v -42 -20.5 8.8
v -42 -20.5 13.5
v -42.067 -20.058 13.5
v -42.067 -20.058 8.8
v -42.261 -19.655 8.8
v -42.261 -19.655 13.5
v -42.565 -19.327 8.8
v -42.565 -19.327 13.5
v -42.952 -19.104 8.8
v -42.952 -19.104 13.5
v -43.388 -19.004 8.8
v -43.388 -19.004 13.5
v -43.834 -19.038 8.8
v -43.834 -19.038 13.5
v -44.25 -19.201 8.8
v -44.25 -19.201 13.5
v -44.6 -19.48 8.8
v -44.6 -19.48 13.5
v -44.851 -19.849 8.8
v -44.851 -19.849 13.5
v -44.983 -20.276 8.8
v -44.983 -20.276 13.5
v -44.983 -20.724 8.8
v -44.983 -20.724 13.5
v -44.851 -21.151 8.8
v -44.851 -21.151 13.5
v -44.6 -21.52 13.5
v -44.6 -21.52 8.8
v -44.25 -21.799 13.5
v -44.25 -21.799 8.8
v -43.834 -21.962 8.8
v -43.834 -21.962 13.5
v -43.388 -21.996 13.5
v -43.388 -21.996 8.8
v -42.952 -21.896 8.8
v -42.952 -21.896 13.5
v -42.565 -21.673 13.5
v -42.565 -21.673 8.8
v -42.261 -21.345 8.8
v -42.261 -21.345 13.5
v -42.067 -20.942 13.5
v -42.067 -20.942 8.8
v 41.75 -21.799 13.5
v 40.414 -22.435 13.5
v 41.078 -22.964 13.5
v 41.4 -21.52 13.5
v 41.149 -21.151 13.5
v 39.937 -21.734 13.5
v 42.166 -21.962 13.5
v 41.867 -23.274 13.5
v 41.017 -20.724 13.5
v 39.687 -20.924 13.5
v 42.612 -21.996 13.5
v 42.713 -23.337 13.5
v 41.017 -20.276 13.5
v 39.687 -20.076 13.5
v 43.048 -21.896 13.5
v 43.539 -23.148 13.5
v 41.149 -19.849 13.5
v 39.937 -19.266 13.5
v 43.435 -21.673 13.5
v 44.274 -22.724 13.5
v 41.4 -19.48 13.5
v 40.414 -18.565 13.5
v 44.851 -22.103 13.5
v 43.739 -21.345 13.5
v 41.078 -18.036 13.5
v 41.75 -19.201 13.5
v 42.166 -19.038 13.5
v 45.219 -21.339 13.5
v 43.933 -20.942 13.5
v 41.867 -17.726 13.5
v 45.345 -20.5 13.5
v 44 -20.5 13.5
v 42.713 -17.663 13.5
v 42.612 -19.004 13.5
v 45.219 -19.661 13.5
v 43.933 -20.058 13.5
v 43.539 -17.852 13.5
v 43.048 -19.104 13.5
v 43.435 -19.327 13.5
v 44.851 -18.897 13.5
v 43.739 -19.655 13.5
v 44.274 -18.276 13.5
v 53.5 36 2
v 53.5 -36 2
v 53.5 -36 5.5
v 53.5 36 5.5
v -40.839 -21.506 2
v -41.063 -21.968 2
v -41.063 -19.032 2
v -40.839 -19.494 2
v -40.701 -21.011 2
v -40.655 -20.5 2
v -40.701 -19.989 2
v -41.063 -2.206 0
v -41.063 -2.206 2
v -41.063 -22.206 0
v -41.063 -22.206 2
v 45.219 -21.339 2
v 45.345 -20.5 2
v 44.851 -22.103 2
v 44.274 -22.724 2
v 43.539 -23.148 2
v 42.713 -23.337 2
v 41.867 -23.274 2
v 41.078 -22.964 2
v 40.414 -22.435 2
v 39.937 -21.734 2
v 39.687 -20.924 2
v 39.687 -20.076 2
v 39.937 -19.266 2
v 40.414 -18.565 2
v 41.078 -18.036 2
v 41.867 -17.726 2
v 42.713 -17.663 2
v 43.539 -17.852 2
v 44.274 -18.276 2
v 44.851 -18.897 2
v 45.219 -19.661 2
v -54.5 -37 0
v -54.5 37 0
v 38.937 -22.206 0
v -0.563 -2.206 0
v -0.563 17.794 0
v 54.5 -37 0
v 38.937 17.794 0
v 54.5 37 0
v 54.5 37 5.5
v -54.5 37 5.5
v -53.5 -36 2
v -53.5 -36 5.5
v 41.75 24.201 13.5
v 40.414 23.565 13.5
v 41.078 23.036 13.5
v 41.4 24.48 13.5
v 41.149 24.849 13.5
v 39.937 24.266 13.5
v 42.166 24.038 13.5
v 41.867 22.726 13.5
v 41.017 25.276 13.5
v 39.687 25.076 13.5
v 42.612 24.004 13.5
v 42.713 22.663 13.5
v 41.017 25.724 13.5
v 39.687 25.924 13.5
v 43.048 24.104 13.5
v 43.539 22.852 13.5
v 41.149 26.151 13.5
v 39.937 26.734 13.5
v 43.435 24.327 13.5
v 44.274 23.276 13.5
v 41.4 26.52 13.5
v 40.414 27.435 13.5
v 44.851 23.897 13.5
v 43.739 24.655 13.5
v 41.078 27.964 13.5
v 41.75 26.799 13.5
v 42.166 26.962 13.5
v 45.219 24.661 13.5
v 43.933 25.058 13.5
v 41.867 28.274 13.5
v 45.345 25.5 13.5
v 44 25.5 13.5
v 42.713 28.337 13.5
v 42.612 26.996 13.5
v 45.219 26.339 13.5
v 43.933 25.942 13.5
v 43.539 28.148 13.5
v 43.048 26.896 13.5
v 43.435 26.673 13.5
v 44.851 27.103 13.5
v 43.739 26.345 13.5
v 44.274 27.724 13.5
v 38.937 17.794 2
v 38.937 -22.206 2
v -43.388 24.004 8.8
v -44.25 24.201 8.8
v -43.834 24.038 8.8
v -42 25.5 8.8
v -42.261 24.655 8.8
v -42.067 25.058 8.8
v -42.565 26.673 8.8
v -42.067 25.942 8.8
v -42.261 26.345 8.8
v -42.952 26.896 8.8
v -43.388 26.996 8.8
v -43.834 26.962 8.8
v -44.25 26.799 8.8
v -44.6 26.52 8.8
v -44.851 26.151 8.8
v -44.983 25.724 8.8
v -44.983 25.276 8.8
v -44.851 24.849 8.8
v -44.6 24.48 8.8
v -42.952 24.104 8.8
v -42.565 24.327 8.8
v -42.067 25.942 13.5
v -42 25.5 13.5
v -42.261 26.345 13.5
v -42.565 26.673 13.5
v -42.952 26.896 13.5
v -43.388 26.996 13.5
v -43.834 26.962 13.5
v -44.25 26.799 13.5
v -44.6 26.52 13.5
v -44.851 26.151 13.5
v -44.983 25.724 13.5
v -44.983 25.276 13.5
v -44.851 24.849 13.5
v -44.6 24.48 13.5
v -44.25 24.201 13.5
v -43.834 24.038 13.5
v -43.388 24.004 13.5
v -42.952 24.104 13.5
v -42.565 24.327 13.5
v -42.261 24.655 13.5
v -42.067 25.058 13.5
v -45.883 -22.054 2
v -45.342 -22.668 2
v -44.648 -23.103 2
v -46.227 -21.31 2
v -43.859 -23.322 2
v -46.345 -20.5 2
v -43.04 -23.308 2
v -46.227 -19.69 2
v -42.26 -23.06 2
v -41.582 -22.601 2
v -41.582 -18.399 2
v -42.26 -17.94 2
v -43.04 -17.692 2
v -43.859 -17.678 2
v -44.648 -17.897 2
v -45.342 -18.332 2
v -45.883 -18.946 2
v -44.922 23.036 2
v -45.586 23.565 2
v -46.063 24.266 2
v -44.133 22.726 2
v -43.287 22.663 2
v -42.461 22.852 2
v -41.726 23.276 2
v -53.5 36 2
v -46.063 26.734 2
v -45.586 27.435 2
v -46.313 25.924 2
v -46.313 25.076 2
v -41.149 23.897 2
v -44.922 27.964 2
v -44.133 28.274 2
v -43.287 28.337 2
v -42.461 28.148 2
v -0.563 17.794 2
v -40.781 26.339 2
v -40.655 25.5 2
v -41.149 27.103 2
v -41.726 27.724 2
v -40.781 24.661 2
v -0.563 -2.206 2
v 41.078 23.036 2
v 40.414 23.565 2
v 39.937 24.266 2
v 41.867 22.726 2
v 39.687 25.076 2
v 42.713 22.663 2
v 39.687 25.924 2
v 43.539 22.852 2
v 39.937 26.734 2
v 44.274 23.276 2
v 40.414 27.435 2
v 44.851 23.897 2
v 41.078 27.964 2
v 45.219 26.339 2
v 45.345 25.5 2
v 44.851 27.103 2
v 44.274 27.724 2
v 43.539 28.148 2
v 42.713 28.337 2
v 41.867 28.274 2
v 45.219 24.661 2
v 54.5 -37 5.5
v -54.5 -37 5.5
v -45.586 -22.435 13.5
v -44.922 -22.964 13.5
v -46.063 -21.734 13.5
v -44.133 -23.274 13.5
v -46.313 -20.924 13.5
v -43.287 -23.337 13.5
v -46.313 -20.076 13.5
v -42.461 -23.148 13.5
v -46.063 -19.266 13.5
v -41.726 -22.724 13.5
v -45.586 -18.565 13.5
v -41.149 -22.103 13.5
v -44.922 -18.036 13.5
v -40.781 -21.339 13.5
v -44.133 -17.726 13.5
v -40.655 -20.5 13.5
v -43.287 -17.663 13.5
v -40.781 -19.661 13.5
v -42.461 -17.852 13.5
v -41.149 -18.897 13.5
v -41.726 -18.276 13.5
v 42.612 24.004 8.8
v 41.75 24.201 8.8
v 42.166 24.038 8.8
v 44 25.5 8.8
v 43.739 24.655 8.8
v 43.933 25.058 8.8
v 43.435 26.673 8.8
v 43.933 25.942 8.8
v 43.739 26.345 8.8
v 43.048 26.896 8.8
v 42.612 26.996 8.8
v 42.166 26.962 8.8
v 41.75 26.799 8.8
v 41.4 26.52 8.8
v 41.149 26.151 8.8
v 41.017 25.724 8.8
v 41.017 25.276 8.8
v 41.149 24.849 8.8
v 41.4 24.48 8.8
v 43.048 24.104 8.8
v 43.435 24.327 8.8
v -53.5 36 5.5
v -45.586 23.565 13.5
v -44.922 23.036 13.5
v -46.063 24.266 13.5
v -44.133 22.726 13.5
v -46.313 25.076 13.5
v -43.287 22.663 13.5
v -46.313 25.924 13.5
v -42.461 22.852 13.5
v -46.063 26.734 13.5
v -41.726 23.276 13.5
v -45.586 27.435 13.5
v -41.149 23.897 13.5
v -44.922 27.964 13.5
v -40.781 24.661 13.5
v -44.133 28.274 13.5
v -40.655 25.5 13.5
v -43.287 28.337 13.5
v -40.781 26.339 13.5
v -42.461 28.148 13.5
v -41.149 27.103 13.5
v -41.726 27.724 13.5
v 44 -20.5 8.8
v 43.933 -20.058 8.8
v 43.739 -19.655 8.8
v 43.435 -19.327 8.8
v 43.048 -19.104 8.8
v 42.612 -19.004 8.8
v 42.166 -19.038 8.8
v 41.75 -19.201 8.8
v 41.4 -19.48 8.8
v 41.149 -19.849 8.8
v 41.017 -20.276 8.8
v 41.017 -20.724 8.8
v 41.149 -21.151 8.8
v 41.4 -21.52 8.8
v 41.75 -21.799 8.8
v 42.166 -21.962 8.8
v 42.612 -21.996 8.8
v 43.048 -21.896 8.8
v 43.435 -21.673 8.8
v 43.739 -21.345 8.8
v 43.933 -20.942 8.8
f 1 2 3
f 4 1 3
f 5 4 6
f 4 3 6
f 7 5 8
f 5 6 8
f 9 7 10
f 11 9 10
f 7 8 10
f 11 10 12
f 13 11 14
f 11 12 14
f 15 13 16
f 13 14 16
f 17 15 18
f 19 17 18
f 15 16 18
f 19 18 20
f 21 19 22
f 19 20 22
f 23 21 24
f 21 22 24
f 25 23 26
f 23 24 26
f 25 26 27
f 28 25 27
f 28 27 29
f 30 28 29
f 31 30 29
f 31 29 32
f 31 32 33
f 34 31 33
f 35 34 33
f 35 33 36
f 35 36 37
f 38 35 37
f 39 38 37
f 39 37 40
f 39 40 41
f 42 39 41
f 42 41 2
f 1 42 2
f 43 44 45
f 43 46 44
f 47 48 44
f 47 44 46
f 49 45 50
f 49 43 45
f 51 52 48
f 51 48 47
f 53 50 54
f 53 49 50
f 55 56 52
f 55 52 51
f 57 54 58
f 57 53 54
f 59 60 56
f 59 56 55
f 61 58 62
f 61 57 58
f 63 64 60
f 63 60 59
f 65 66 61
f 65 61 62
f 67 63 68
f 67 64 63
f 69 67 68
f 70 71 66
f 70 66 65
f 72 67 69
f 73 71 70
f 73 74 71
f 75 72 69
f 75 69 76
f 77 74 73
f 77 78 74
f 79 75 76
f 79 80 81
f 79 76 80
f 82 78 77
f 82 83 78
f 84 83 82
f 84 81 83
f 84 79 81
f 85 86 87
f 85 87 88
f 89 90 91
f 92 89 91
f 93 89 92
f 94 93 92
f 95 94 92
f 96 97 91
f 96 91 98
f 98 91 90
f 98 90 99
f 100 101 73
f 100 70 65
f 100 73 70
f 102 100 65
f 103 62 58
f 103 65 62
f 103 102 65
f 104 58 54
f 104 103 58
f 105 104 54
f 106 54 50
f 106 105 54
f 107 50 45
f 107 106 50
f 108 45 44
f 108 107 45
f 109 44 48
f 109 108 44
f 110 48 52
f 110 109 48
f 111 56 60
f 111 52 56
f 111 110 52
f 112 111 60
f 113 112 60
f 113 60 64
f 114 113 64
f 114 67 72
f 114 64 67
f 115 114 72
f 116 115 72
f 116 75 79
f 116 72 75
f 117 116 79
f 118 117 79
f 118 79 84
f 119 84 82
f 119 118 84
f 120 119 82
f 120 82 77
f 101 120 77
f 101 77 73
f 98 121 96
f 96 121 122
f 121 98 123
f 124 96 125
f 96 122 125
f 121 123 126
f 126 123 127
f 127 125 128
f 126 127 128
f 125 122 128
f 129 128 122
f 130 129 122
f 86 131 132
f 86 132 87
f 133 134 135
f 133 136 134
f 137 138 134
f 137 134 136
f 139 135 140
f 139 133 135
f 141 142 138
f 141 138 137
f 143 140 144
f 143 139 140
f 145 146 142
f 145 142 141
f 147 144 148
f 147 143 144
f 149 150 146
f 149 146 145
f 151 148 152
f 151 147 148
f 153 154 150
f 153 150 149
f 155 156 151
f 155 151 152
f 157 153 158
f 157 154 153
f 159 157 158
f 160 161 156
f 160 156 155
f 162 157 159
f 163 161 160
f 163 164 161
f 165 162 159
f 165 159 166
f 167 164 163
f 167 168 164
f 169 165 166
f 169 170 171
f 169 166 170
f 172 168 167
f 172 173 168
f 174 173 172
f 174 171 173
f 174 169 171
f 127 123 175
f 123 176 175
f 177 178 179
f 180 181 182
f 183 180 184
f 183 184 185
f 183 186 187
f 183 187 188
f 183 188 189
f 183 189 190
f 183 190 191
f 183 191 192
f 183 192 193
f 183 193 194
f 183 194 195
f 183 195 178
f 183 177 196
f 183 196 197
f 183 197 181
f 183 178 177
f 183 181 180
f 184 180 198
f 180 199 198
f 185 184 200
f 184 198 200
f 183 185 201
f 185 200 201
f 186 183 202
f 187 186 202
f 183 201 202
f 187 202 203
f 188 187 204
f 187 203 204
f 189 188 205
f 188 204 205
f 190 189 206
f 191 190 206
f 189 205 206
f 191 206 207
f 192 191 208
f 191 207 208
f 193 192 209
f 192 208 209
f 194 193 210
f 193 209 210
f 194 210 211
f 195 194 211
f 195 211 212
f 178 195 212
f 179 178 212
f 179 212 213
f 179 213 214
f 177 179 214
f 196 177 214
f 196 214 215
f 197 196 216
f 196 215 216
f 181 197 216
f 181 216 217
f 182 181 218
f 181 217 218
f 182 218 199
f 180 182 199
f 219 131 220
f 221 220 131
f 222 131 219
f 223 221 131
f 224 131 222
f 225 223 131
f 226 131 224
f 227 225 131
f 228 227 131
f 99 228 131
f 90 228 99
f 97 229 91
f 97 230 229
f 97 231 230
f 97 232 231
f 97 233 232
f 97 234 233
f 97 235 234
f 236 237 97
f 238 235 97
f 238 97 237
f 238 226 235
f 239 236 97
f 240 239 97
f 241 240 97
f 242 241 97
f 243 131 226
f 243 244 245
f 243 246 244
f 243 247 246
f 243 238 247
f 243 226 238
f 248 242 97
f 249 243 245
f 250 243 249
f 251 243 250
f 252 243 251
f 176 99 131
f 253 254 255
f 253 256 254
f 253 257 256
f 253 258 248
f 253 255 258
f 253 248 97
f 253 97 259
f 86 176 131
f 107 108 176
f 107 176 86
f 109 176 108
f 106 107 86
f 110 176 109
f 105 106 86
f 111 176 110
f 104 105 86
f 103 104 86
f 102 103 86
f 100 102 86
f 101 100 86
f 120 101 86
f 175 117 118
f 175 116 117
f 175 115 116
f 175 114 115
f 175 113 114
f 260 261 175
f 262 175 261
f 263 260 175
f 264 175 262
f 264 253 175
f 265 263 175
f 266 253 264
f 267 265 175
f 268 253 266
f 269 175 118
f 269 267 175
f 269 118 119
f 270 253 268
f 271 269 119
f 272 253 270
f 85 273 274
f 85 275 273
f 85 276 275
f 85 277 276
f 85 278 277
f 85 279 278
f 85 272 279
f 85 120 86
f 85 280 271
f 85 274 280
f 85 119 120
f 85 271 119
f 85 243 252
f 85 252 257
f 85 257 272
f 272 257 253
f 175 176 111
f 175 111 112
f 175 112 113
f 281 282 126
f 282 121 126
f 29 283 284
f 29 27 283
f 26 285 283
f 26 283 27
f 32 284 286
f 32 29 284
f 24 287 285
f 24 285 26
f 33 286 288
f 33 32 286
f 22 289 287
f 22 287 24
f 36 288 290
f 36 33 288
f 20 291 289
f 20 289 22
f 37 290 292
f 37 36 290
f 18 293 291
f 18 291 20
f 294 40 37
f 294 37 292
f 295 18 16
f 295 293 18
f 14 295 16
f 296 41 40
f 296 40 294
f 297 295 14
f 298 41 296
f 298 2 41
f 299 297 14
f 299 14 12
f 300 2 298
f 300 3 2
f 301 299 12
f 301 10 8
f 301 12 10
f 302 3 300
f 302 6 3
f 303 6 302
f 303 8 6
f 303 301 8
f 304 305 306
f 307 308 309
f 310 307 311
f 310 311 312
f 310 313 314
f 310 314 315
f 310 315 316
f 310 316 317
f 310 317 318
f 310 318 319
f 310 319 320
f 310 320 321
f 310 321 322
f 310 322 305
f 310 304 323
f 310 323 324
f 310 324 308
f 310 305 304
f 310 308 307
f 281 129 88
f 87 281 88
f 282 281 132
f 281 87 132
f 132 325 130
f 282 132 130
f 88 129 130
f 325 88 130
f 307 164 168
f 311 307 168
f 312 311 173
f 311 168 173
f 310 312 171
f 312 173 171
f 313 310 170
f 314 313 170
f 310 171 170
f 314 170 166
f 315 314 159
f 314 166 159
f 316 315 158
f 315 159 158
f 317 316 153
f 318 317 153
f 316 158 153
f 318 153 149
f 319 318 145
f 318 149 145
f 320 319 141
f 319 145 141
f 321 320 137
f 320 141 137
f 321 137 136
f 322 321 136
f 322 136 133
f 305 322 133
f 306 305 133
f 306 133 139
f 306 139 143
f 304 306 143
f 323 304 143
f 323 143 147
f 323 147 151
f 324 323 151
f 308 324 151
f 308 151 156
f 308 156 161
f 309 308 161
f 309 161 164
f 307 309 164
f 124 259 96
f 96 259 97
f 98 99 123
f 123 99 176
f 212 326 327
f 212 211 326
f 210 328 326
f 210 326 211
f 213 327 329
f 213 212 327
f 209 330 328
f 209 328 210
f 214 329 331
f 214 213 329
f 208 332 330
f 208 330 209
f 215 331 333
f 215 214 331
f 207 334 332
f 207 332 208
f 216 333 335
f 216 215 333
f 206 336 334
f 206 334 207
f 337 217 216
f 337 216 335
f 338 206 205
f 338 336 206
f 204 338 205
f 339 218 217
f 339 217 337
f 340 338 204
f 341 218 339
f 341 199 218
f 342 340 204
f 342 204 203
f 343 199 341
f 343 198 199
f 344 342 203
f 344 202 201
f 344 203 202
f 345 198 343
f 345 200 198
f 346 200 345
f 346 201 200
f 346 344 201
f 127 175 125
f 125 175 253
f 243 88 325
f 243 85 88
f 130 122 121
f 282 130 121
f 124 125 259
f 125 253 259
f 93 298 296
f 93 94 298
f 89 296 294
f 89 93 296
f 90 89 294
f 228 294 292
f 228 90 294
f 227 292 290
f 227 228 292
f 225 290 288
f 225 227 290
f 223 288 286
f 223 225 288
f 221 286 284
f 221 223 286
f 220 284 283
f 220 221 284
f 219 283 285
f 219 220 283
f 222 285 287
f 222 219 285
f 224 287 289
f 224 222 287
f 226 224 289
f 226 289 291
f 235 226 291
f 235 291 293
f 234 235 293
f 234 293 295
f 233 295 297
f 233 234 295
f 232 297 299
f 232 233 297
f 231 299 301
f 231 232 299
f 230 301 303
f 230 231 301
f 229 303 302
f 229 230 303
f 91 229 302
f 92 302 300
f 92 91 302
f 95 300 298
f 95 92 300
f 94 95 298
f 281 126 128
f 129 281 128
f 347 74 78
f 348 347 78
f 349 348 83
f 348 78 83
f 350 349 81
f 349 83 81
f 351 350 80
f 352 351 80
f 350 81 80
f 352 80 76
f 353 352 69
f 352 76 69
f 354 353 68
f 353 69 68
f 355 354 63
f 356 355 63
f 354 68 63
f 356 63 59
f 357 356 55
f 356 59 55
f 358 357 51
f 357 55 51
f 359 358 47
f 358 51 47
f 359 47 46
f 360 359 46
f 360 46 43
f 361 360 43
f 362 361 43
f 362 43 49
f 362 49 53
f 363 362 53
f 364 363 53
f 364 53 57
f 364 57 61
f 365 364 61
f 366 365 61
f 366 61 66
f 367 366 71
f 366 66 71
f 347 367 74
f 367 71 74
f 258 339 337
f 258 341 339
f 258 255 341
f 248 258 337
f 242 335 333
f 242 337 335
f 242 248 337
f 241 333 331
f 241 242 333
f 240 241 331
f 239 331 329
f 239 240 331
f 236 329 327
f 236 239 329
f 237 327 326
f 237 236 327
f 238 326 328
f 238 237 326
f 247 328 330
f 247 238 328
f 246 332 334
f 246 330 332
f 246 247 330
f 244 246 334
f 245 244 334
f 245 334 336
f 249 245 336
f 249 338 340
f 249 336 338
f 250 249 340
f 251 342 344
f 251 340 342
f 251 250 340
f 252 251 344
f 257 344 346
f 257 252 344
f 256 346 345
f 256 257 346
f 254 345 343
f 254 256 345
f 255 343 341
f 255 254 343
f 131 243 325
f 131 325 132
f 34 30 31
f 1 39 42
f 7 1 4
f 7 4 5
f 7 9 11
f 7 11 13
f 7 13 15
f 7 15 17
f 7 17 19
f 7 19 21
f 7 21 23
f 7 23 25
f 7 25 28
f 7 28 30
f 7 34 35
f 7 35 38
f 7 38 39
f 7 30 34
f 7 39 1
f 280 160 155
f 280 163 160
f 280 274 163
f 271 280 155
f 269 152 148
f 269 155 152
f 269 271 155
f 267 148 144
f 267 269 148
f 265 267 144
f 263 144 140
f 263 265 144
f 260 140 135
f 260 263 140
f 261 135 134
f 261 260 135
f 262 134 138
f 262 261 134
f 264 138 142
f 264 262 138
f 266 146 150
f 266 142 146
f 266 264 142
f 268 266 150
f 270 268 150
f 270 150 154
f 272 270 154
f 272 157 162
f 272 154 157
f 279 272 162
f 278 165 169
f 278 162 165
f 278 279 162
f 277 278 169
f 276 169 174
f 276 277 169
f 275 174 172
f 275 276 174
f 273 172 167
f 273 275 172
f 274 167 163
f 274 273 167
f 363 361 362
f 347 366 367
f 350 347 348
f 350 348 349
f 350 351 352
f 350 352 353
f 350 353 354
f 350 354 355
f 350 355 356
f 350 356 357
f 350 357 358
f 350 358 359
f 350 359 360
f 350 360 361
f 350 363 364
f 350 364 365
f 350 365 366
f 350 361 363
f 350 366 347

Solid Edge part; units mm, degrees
sketch "Sketch1" plane through (0, 0, 0) normal (0, 0, 1) x (1, 0, 0)
  line L0 (-54.5, -37) -> (54.5, -37)
  line L1 (54.5, -37) -> (54.5, 37)
  line L2 (54.5, 37) -> (-54.5, 37)
  line L3 (-54.5, 37) -> (-54.5, -37)
extrude "Protrusion1" add sketch "Sketch1" along normal blind 2
sketch "Sketch2" plane through (0, 0, 2) normal (0, 0, 1) x (1, 0, 0)
  line L0 (-54.5, 37) -> (54.5, 37)
  line L1 (54.5, 37) -> (54.5, -37)
  line L2 (54.5, -37) -> (-54.5, -37)
  line L3 (-54.5, -37) -> (-54.5, 37)
  line L4 (-53.5, 36) -> (-53.5, -36)
  line L5 (-53.5, -36) -> (53.5, -36)
  line L6 (53.5, -36) -> (53.5, 36)
  line L7 (53.5, 36) -> (-53.5, 36)
  dimension "D1" = 107
  dimension "D2" = 72
  dimension "D3" = 5.69
  dimension "D4" = 5.69
  dimension "D5" = 5.69
  dimension "D6" = 5.69
  dimension "D7" = 11.5
  dimension "D8" = 46
  dimension "D9" = 11
  dimension "D10" = 86
  dimension "D11" = 109
  dimension "D12" = 74
extrude "ExtrudedProtrusion_3" add sketch "Sketch2" along normal blind 3.5
sketch "Sketch3" plane through (0, 0, 2) normal (0, 0, 1) x (1, 0, 0)
  circle A0 centre (-43.5, 25.5) radius 2.845
  circle A1 centre (-43.5, -20.5) radius 2.845
  circle A2 centre (42.5, 25.5) radius 2.845
  circle A3 centre (42.5, -20.5) radius 2.845
  dimension "D1" = 107
  dimension "D2" = 72
  dimension "D3" = 5.69
  dimension "D4" = 5.69
  dimension "D5" = 5.69
  dimension "D6" = 5.69
  dimension "D7" = 11.5
  dimension "D8" = 46
  dimension "D9" = 11
  dimension "D10" = 86
  dimension "D11" = 109
  dimension "D12" = 74
extrude "ExtrudedProtrusion_4" add sketch "Sketch3" along normal blind 11.5
sketch "Sketch4" plane through (-42.5, 25.5, 13.5) normal (0, 0, 1) x (1, 0, 0)
  circle A0 centre (-1, 0) radius 1.5
  circle A1 centre (85, 0) radius 1.5
  circle A2 centre (85, -46) radius 1.5
  circle A3 centre (-1, -46) radius 1.5
  dimension "D1" = 3
  dimension "D2" = 3
  dimension "D3" = 3
  dimension "D4" = 3
extrude "ExtrudedCutout_1" cut sketch "Sketch4" against normal blind 4.7
sketch "Sketch5" plane through (0, 0, 2) normal (0, 0, 1) x (1, 0, 0)
  line L0 (-0.5627, 17.794) -> (-0.5627, -2.206)
  line L1 (-0.5627, -2.206) -> (-41.0627, -2.206)
  line L2 (-41.0627, -2.206) -> (-41.0627, -22.206)
  line L3 (-41.0627, -22.206) -> (38.9373, -22.206)
  line L4 (38.9373, -22.206) -> (38.9373, 17.794)
  line L5 (38.9373, 17.794) -> (-0.5627, 17.794)
extrude "Cutout1" cut sketch "Sketch5" against normal through all
